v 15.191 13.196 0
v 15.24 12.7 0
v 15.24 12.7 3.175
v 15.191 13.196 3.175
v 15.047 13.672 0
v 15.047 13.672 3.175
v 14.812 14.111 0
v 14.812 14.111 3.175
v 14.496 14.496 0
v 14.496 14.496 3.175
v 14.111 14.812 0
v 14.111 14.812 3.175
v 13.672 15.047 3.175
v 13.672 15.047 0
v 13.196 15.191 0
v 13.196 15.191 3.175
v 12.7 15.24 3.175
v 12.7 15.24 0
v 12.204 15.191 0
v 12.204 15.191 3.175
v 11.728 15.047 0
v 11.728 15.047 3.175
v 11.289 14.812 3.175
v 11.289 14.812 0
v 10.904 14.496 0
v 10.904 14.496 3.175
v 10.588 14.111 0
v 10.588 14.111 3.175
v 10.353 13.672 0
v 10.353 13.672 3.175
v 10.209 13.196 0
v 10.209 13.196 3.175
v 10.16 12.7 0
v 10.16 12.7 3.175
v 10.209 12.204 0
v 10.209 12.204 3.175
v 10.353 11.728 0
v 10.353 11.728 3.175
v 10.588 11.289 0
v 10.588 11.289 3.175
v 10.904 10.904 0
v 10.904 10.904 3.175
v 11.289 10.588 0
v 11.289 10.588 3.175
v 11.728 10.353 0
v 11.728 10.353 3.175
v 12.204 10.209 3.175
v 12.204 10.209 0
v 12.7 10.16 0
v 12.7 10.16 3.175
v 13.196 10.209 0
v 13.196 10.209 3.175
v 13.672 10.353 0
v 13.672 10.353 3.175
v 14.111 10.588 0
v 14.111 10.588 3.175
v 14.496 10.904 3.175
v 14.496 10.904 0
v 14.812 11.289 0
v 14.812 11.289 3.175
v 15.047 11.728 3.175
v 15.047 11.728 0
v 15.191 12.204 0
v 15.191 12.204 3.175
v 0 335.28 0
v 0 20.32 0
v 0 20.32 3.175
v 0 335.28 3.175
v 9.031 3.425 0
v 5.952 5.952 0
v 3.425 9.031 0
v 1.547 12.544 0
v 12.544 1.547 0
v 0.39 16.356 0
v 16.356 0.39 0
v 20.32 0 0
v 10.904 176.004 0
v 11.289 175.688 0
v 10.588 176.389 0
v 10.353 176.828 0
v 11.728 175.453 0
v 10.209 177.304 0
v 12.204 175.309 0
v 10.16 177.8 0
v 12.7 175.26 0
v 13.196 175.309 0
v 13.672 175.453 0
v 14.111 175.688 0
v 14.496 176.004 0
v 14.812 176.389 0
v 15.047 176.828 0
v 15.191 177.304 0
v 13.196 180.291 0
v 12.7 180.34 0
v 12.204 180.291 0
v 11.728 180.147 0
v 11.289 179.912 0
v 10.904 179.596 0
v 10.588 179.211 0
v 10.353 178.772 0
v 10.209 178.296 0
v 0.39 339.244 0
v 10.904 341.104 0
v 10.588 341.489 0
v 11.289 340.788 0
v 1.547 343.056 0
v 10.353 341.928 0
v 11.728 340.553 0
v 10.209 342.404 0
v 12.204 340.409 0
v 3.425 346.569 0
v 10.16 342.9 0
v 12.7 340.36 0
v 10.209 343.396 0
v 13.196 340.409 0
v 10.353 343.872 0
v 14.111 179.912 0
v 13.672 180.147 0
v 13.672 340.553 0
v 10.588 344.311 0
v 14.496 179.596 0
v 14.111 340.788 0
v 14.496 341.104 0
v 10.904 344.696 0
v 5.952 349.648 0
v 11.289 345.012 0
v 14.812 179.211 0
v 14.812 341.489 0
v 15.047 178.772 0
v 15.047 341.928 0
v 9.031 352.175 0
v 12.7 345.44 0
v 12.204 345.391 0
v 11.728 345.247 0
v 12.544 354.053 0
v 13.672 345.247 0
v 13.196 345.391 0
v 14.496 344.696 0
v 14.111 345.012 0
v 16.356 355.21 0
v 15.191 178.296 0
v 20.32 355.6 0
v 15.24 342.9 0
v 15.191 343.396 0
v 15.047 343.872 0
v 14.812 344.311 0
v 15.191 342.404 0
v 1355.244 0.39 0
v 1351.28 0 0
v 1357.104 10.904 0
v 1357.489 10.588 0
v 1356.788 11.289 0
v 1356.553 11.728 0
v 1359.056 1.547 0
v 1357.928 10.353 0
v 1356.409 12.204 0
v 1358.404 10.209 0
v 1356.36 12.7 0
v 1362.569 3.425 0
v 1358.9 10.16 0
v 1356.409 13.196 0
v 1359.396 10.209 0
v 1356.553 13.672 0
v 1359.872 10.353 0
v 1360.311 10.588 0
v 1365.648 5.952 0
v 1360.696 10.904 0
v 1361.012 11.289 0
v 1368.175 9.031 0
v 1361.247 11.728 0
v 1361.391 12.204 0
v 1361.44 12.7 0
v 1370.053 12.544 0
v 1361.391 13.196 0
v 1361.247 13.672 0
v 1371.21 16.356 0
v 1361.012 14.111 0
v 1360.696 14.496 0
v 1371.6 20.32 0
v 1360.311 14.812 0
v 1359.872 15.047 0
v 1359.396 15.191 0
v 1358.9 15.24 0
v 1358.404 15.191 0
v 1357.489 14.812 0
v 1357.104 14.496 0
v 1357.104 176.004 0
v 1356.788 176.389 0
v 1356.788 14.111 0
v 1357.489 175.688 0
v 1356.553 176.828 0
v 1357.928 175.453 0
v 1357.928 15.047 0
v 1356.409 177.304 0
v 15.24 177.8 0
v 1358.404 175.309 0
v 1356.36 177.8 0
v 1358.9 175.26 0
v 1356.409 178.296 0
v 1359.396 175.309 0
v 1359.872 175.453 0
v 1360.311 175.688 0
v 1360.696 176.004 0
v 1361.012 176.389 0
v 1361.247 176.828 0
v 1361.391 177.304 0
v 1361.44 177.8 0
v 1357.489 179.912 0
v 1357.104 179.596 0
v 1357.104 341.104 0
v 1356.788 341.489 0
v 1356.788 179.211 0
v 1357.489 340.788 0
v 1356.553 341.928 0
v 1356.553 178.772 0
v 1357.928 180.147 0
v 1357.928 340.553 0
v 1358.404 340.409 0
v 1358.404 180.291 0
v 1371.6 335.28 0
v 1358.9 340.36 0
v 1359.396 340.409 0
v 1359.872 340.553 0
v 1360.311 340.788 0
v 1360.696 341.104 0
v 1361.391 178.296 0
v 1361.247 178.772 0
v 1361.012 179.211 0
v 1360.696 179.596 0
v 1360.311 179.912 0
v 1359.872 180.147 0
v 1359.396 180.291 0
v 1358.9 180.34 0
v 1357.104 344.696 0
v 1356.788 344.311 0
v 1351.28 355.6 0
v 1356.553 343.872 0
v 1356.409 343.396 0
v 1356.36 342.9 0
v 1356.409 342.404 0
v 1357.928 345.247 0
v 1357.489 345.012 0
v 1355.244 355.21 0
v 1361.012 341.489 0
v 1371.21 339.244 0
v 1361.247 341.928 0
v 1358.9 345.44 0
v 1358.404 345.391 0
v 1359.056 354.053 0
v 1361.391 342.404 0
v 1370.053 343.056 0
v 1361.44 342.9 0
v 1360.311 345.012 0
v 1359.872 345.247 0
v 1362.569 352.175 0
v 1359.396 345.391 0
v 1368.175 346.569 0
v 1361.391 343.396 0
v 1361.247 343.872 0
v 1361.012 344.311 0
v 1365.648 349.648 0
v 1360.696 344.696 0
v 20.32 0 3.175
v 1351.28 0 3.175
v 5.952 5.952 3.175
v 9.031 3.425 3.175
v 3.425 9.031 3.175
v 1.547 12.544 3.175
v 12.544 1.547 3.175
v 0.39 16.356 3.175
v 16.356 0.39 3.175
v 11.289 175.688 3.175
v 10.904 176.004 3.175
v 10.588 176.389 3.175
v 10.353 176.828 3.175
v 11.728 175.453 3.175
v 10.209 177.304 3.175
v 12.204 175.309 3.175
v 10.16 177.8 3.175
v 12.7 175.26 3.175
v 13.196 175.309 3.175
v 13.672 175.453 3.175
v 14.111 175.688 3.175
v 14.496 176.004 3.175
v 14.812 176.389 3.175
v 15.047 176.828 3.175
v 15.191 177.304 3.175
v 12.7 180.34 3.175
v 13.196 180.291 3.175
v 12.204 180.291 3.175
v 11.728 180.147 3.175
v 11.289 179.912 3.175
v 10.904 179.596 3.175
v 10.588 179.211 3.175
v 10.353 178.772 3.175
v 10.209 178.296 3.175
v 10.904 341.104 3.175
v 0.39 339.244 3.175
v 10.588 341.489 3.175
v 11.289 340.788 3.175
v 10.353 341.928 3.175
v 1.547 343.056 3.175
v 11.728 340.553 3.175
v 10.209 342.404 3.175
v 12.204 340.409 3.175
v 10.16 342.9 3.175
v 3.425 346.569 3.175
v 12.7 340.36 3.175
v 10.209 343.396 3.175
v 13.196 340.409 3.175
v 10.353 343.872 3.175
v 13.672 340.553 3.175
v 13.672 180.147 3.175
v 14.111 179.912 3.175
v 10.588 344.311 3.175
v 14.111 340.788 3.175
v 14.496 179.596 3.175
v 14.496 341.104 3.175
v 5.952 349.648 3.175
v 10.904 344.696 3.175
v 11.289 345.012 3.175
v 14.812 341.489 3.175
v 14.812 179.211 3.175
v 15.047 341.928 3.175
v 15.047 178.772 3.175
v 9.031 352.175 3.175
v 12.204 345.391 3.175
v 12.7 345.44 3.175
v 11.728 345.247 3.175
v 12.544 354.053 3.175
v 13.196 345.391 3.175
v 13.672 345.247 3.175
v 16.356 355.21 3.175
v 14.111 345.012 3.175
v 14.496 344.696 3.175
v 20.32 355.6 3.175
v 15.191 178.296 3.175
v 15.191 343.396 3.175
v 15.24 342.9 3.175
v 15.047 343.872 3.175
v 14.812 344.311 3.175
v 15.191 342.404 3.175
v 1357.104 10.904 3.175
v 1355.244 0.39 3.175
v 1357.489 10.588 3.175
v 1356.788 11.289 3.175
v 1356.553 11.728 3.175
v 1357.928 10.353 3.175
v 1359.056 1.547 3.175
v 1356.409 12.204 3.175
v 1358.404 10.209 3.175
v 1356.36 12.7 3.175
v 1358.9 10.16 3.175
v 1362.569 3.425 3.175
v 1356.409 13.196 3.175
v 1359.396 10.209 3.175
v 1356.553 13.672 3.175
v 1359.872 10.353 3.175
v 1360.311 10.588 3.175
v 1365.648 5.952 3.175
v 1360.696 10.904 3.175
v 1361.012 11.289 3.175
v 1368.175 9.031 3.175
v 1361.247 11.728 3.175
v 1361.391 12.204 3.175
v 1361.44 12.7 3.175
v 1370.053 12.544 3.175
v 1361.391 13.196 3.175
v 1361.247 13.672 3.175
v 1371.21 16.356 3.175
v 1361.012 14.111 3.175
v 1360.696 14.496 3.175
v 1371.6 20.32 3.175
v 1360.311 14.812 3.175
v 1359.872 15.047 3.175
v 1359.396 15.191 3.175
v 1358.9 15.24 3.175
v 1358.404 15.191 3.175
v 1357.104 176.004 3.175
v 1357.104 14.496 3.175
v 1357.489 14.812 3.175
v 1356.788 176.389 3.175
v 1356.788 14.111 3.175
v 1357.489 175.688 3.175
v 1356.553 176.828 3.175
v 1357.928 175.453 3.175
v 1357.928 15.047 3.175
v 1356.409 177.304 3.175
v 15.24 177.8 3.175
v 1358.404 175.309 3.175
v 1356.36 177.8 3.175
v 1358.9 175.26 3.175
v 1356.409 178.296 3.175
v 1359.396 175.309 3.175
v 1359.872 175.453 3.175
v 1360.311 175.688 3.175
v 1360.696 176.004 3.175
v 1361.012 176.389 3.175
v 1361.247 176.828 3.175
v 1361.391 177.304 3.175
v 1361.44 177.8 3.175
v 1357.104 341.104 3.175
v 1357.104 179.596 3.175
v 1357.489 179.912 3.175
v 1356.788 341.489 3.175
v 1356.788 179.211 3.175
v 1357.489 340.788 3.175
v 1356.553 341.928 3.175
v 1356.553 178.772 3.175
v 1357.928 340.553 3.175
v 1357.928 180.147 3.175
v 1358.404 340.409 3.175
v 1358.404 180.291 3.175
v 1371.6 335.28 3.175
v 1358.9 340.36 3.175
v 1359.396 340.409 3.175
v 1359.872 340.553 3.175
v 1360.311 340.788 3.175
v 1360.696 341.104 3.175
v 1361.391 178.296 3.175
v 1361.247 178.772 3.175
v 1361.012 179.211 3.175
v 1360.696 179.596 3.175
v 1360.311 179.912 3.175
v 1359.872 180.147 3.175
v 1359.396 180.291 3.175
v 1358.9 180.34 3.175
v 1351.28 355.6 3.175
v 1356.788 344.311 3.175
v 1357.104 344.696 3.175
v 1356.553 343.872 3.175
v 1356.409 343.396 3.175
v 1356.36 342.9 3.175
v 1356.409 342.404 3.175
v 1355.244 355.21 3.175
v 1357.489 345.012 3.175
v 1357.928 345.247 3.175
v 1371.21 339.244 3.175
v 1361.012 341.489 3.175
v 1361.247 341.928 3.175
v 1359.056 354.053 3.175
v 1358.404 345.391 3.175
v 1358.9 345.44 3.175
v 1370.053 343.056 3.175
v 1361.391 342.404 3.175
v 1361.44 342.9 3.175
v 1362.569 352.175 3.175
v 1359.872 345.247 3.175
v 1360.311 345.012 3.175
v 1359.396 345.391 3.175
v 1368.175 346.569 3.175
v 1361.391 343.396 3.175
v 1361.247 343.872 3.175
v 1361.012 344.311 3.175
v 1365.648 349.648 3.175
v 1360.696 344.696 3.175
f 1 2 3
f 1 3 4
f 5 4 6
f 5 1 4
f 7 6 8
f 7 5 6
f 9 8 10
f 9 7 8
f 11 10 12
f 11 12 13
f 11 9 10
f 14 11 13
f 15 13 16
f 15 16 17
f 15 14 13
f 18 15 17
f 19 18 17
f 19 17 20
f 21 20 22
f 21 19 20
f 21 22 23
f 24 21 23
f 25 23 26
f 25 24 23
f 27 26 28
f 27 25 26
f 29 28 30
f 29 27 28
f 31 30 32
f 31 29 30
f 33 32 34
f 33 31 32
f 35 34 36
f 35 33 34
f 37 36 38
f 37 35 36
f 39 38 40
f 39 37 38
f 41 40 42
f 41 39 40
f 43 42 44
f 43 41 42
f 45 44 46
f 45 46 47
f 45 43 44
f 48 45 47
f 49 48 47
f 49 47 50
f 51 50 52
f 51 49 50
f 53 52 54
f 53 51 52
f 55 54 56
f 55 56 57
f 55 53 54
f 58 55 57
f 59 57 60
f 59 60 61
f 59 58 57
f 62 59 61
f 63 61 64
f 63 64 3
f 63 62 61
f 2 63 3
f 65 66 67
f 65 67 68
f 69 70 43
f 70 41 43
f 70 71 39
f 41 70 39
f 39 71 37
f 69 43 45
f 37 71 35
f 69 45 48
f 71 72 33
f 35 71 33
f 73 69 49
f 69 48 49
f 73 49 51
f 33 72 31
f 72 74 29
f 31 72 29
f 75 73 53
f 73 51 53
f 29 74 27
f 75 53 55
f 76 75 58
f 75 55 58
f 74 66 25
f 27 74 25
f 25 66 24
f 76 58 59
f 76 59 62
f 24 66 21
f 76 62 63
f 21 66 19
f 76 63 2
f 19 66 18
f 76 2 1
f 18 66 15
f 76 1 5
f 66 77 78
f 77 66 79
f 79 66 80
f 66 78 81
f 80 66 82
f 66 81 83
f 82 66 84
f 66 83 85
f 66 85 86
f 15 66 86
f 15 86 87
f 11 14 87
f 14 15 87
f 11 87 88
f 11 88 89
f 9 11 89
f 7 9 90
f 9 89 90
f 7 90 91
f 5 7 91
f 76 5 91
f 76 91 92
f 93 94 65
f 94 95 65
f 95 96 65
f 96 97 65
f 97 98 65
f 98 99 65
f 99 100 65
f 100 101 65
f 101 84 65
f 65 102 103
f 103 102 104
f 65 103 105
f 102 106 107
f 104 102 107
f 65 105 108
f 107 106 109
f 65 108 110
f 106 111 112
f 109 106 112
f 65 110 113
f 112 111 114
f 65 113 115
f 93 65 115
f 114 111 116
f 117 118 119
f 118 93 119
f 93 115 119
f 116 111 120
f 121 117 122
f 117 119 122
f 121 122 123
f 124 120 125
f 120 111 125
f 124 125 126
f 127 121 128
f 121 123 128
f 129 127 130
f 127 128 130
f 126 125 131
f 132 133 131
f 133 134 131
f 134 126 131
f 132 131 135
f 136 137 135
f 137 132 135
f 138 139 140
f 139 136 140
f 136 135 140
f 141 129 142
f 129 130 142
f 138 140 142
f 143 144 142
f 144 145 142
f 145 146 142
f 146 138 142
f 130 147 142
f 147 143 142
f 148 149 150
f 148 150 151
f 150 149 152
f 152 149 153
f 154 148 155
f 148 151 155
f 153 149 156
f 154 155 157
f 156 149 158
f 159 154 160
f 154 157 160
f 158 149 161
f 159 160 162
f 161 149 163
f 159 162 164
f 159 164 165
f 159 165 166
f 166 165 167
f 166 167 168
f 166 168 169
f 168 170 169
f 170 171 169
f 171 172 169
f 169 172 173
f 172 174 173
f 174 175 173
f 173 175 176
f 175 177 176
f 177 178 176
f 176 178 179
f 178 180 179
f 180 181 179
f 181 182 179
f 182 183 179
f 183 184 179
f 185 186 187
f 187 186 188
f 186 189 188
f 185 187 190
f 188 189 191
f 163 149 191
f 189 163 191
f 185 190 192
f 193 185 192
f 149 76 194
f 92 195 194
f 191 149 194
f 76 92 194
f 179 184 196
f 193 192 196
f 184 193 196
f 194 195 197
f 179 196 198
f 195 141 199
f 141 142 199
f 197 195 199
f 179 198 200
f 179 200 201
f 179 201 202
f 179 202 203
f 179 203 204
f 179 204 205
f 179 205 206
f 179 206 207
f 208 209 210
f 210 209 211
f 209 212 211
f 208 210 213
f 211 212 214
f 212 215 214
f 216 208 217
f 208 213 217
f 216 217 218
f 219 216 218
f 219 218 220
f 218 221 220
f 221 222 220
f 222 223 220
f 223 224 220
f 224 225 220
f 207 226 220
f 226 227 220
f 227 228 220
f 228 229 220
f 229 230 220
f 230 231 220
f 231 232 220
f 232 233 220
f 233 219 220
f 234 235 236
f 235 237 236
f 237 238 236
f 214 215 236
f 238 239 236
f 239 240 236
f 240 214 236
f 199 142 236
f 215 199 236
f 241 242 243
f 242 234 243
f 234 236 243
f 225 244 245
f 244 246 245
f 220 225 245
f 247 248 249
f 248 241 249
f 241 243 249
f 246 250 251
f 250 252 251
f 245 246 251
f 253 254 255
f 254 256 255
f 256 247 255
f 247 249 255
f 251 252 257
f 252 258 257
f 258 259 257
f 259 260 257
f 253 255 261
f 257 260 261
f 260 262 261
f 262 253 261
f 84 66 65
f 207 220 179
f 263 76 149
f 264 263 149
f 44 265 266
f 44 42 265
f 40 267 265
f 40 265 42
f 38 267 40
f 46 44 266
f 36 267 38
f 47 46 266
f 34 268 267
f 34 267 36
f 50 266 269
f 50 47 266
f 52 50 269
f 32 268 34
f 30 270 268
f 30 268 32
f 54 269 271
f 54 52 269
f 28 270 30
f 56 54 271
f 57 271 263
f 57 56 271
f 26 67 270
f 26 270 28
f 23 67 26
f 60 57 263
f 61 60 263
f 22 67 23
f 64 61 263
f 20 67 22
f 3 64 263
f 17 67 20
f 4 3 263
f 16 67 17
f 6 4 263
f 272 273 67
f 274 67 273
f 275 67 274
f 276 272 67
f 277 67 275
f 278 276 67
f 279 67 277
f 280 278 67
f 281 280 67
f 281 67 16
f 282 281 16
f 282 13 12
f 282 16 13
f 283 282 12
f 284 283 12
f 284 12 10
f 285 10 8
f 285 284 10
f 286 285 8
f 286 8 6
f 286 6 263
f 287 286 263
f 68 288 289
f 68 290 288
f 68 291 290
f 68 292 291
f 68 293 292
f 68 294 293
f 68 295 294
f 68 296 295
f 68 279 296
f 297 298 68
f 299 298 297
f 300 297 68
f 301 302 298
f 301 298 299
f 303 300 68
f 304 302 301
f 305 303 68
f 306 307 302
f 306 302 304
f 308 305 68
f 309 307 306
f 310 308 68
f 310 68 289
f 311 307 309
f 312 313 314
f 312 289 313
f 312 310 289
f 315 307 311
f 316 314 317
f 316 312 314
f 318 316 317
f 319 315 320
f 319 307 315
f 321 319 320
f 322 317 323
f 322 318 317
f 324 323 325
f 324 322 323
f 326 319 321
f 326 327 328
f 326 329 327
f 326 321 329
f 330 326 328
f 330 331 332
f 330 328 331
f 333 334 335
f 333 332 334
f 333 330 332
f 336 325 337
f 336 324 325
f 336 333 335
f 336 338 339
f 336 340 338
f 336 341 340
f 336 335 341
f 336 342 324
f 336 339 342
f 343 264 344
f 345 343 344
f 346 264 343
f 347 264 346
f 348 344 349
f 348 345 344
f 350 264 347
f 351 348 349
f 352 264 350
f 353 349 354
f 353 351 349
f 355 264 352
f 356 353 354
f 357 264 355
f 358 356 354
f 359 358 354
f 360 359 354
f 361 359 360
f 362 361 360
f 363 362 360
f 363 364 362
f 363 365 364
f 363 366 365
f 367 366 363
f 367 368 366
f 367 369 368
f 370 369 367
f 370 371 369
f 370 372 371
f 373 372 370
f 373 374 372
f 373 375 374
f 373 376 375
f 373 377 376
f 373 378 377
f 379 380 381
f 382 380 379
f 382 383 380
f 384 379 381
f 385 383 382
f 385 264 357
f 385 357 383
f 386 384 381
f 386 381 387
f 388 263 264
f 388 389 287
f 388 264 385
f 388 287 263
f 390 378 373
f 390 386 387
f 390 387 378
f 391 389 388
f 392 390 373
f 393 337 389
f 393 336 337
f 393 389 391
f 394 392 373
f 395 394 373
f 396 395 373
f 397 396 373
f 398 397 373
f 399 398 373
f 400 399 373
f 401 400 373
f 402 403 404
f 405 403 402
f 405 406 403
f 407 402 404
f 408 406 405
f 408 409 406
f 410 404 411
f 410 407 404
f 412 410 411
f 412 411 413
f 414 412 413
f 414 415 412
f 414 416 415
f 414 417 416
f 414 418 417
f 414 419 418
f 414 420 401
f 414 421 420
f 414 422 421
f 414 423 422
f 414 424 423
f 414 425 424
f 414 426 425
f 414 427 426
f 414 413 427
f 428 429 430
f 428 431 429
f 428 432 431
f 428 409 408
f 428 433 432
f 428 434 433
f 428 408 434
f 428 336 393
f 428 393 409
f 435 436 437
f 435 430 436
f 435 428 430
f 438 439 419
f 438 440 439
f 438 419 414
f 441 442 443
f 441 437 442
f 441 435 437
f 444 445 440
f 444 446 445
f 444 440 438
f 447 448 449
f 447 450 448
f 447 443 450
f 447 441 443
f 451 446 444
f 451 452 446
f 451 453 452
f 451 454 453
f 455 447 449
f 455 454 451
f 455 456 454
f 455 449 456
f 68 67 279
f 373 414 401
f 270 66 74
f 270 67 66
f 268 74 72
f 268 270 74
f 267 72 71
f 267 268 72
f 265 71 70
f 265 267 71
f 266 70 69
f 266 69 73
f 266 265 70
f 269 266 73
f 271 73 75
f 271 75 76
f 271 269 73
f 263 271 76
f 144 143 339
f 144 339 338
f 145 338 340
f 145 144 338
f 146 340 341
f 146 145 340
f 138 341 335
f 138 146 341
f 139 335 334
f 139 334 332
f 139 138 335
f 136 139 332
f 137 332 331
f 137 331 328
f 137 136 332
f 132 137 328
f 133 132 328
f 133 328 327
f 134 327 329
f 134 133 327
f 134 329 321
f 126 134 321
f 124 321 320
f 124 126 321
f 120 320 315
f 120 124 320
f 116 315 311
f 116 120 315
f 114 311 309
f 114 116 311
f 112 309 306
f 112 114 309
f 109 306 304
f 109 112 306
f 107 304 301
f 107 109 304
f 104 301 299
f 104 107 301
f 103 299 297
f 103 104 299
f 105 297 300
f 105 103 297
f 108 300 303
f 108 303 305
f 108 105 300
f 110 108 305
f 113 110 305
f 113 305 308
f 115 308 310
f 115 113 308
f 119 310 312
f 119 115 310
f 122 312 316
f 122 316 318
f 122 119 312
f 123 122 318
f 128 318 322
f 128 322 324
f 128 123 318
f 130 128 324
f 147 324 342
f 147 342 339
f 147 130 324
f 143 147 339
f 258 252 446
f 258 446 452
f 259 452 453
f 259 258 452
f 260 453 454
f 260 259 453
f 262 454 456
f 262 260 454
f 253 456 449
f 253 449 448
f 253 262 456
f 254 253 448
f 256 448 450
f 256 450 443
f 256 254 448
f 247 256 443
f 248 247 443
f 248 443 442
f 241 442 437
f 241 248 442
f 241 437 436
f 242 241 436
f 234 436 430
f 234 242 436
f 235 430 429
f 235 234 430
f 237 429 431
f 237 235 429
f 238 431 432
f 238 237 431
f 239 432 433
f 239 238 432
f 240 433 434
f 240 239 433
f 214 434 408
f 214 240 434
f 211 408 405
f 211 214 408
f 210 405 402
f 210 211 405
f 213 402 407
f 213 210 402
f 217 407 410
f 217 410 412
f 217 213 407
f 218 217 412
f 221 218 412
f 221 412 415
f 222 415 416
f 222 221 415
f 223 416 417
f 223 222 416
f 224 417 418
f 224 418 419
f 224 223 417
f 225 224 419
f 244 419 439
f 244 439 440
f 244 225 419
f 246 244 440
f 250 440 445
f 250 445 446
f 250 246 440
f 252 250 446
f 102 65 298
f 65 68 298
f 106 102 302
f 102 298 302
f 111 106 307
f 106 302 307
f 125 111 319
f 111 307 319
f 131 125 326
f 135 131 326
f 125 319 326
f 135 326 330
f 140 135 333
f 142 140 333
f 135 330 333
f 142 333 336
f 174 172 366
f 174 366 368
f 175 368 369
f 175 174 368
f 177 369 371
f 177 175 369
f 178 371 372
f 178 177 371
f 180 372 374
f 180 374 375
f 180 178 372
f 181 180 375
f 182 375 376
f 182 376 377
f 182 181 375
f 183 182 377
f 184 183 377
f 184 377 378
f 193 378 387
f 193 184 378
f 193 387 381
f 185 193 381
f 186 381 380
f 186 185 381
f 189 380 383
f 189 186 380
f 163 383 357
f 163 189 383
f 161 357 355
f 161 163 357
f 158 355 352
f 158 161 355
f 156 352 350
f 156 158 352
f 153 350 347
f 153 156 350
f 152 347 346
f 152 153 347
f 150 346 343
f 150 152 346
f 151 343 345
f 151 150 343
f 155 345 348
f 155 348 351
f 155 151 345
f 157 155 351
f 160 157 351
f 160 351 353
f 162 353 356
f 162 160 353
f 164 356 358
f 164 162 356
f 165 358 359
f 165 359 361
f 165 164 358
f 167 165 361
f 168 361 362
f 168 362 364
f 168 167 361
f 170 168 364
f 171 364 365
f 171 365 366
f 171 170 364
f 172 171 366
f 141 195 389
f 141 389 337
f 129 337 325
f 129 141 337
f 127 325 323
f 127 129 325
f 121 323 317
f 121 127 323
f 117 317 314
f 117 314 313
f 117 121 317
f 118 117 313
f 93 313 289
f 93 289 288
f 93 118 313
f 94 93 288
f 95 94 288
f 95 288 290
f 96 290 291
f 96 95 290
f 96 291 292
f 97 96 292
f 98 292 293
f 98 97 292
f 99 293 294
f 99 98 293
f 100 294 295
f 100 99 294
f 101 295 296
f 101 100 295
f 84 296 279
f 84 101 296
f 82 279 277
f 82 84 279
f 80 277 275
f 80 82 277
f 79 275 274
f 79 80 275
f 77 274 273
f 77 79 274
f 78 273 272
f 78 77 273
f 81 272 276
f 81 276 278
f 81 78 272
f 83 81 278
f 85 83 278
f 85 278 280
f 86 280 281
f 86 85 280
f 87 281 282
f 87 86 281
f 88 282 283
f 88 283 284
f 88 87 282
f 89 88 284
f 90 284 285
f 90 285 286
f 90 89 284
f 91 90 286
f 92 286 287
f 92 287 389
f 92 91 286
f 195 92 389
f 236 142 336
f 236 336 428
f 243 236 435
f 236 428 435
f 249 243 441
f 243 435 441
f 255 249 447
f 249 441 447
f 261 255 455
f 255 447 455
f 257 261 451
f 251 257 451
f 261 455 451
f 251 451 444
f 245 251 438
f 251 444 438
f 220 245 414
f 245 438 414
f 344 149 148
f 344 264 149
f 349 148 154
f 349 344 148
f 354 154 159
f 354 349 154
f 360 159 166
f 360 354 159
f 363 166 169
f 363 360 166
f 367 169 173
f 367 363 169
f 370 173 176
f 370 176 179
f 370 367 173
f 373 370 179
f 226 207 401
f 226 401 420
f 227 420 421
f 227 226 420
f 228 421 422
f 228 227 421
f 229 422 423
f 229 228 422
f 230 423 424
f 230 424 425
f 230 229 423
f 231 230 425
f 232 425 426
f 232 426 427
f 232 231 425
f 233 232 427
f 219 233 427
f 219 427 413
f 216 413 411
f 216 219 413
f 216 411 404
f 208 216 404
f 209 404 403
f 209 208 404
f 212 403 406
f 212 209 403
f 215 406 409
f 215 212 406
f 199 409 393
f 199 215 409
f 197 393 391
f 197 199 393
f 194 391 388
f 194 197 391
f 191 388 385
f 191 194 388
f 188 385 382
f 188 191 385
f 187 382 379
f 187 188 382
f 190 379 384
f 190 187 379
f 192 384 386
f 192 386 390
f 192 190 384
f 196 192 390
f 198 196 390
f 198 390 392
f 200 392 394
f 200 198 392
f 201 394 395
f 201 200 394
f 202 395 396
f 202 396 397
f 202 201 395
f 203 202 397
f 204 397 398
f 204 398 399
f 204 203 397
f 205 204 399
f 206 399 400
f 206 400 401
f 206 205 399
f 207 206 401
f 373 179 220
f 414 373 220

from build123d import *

# Parameters (mm, degrees)
F0_W     = 1371.6
F0_H     = 355.6
F0_R     = 2.54
F1_DEPTH = 3.175
F2_R     = 20.32


with BuildPart() as f1:
    # F0 (on Top) → F1 (new body)
    with BuildSketch(Plane.XY):
        with Locations((685.8, 177.8)):
            Rectangle(F0_W, F0_H)
        with Locations((12.7, 12.7)):
            Circle(F0_R, mode=Mode.SUBTRACT)
        with Locations((1358.9, 12.7)):
            Circle(F0_R, mode=Mode.SUBTRACT)
        with Locations((12.7, 177.8)):
            Circle(F0_R, mode=Mode.SUBTRACT)
        with Locations((12.7, 342.9)):
            Circle(F0_R, mode=Mode.SUBTRACT)
        with Locations((1358.9, 177.8)):
            Circle(F0_R, mode=Mode.SUBTRACT)
        with Locations((1358.9, 342.9)):
            Circle(F0_R, mode=Mode.SUBTRACT)
    extrude(amount=F1_DEPTH)

    # F2
    f2_edges = [f1.edges().sort_by_distance(p)[0] for p in [
        (0, 355.6, 1.5875),
        (0, 0, 1.5875),
        (1371.6, 0, 1.5875),
        (1371.6, 355.6, 1.5875),
    ]]
    fillet(f2_edges, radius=F2_R)


solid = f1.part
